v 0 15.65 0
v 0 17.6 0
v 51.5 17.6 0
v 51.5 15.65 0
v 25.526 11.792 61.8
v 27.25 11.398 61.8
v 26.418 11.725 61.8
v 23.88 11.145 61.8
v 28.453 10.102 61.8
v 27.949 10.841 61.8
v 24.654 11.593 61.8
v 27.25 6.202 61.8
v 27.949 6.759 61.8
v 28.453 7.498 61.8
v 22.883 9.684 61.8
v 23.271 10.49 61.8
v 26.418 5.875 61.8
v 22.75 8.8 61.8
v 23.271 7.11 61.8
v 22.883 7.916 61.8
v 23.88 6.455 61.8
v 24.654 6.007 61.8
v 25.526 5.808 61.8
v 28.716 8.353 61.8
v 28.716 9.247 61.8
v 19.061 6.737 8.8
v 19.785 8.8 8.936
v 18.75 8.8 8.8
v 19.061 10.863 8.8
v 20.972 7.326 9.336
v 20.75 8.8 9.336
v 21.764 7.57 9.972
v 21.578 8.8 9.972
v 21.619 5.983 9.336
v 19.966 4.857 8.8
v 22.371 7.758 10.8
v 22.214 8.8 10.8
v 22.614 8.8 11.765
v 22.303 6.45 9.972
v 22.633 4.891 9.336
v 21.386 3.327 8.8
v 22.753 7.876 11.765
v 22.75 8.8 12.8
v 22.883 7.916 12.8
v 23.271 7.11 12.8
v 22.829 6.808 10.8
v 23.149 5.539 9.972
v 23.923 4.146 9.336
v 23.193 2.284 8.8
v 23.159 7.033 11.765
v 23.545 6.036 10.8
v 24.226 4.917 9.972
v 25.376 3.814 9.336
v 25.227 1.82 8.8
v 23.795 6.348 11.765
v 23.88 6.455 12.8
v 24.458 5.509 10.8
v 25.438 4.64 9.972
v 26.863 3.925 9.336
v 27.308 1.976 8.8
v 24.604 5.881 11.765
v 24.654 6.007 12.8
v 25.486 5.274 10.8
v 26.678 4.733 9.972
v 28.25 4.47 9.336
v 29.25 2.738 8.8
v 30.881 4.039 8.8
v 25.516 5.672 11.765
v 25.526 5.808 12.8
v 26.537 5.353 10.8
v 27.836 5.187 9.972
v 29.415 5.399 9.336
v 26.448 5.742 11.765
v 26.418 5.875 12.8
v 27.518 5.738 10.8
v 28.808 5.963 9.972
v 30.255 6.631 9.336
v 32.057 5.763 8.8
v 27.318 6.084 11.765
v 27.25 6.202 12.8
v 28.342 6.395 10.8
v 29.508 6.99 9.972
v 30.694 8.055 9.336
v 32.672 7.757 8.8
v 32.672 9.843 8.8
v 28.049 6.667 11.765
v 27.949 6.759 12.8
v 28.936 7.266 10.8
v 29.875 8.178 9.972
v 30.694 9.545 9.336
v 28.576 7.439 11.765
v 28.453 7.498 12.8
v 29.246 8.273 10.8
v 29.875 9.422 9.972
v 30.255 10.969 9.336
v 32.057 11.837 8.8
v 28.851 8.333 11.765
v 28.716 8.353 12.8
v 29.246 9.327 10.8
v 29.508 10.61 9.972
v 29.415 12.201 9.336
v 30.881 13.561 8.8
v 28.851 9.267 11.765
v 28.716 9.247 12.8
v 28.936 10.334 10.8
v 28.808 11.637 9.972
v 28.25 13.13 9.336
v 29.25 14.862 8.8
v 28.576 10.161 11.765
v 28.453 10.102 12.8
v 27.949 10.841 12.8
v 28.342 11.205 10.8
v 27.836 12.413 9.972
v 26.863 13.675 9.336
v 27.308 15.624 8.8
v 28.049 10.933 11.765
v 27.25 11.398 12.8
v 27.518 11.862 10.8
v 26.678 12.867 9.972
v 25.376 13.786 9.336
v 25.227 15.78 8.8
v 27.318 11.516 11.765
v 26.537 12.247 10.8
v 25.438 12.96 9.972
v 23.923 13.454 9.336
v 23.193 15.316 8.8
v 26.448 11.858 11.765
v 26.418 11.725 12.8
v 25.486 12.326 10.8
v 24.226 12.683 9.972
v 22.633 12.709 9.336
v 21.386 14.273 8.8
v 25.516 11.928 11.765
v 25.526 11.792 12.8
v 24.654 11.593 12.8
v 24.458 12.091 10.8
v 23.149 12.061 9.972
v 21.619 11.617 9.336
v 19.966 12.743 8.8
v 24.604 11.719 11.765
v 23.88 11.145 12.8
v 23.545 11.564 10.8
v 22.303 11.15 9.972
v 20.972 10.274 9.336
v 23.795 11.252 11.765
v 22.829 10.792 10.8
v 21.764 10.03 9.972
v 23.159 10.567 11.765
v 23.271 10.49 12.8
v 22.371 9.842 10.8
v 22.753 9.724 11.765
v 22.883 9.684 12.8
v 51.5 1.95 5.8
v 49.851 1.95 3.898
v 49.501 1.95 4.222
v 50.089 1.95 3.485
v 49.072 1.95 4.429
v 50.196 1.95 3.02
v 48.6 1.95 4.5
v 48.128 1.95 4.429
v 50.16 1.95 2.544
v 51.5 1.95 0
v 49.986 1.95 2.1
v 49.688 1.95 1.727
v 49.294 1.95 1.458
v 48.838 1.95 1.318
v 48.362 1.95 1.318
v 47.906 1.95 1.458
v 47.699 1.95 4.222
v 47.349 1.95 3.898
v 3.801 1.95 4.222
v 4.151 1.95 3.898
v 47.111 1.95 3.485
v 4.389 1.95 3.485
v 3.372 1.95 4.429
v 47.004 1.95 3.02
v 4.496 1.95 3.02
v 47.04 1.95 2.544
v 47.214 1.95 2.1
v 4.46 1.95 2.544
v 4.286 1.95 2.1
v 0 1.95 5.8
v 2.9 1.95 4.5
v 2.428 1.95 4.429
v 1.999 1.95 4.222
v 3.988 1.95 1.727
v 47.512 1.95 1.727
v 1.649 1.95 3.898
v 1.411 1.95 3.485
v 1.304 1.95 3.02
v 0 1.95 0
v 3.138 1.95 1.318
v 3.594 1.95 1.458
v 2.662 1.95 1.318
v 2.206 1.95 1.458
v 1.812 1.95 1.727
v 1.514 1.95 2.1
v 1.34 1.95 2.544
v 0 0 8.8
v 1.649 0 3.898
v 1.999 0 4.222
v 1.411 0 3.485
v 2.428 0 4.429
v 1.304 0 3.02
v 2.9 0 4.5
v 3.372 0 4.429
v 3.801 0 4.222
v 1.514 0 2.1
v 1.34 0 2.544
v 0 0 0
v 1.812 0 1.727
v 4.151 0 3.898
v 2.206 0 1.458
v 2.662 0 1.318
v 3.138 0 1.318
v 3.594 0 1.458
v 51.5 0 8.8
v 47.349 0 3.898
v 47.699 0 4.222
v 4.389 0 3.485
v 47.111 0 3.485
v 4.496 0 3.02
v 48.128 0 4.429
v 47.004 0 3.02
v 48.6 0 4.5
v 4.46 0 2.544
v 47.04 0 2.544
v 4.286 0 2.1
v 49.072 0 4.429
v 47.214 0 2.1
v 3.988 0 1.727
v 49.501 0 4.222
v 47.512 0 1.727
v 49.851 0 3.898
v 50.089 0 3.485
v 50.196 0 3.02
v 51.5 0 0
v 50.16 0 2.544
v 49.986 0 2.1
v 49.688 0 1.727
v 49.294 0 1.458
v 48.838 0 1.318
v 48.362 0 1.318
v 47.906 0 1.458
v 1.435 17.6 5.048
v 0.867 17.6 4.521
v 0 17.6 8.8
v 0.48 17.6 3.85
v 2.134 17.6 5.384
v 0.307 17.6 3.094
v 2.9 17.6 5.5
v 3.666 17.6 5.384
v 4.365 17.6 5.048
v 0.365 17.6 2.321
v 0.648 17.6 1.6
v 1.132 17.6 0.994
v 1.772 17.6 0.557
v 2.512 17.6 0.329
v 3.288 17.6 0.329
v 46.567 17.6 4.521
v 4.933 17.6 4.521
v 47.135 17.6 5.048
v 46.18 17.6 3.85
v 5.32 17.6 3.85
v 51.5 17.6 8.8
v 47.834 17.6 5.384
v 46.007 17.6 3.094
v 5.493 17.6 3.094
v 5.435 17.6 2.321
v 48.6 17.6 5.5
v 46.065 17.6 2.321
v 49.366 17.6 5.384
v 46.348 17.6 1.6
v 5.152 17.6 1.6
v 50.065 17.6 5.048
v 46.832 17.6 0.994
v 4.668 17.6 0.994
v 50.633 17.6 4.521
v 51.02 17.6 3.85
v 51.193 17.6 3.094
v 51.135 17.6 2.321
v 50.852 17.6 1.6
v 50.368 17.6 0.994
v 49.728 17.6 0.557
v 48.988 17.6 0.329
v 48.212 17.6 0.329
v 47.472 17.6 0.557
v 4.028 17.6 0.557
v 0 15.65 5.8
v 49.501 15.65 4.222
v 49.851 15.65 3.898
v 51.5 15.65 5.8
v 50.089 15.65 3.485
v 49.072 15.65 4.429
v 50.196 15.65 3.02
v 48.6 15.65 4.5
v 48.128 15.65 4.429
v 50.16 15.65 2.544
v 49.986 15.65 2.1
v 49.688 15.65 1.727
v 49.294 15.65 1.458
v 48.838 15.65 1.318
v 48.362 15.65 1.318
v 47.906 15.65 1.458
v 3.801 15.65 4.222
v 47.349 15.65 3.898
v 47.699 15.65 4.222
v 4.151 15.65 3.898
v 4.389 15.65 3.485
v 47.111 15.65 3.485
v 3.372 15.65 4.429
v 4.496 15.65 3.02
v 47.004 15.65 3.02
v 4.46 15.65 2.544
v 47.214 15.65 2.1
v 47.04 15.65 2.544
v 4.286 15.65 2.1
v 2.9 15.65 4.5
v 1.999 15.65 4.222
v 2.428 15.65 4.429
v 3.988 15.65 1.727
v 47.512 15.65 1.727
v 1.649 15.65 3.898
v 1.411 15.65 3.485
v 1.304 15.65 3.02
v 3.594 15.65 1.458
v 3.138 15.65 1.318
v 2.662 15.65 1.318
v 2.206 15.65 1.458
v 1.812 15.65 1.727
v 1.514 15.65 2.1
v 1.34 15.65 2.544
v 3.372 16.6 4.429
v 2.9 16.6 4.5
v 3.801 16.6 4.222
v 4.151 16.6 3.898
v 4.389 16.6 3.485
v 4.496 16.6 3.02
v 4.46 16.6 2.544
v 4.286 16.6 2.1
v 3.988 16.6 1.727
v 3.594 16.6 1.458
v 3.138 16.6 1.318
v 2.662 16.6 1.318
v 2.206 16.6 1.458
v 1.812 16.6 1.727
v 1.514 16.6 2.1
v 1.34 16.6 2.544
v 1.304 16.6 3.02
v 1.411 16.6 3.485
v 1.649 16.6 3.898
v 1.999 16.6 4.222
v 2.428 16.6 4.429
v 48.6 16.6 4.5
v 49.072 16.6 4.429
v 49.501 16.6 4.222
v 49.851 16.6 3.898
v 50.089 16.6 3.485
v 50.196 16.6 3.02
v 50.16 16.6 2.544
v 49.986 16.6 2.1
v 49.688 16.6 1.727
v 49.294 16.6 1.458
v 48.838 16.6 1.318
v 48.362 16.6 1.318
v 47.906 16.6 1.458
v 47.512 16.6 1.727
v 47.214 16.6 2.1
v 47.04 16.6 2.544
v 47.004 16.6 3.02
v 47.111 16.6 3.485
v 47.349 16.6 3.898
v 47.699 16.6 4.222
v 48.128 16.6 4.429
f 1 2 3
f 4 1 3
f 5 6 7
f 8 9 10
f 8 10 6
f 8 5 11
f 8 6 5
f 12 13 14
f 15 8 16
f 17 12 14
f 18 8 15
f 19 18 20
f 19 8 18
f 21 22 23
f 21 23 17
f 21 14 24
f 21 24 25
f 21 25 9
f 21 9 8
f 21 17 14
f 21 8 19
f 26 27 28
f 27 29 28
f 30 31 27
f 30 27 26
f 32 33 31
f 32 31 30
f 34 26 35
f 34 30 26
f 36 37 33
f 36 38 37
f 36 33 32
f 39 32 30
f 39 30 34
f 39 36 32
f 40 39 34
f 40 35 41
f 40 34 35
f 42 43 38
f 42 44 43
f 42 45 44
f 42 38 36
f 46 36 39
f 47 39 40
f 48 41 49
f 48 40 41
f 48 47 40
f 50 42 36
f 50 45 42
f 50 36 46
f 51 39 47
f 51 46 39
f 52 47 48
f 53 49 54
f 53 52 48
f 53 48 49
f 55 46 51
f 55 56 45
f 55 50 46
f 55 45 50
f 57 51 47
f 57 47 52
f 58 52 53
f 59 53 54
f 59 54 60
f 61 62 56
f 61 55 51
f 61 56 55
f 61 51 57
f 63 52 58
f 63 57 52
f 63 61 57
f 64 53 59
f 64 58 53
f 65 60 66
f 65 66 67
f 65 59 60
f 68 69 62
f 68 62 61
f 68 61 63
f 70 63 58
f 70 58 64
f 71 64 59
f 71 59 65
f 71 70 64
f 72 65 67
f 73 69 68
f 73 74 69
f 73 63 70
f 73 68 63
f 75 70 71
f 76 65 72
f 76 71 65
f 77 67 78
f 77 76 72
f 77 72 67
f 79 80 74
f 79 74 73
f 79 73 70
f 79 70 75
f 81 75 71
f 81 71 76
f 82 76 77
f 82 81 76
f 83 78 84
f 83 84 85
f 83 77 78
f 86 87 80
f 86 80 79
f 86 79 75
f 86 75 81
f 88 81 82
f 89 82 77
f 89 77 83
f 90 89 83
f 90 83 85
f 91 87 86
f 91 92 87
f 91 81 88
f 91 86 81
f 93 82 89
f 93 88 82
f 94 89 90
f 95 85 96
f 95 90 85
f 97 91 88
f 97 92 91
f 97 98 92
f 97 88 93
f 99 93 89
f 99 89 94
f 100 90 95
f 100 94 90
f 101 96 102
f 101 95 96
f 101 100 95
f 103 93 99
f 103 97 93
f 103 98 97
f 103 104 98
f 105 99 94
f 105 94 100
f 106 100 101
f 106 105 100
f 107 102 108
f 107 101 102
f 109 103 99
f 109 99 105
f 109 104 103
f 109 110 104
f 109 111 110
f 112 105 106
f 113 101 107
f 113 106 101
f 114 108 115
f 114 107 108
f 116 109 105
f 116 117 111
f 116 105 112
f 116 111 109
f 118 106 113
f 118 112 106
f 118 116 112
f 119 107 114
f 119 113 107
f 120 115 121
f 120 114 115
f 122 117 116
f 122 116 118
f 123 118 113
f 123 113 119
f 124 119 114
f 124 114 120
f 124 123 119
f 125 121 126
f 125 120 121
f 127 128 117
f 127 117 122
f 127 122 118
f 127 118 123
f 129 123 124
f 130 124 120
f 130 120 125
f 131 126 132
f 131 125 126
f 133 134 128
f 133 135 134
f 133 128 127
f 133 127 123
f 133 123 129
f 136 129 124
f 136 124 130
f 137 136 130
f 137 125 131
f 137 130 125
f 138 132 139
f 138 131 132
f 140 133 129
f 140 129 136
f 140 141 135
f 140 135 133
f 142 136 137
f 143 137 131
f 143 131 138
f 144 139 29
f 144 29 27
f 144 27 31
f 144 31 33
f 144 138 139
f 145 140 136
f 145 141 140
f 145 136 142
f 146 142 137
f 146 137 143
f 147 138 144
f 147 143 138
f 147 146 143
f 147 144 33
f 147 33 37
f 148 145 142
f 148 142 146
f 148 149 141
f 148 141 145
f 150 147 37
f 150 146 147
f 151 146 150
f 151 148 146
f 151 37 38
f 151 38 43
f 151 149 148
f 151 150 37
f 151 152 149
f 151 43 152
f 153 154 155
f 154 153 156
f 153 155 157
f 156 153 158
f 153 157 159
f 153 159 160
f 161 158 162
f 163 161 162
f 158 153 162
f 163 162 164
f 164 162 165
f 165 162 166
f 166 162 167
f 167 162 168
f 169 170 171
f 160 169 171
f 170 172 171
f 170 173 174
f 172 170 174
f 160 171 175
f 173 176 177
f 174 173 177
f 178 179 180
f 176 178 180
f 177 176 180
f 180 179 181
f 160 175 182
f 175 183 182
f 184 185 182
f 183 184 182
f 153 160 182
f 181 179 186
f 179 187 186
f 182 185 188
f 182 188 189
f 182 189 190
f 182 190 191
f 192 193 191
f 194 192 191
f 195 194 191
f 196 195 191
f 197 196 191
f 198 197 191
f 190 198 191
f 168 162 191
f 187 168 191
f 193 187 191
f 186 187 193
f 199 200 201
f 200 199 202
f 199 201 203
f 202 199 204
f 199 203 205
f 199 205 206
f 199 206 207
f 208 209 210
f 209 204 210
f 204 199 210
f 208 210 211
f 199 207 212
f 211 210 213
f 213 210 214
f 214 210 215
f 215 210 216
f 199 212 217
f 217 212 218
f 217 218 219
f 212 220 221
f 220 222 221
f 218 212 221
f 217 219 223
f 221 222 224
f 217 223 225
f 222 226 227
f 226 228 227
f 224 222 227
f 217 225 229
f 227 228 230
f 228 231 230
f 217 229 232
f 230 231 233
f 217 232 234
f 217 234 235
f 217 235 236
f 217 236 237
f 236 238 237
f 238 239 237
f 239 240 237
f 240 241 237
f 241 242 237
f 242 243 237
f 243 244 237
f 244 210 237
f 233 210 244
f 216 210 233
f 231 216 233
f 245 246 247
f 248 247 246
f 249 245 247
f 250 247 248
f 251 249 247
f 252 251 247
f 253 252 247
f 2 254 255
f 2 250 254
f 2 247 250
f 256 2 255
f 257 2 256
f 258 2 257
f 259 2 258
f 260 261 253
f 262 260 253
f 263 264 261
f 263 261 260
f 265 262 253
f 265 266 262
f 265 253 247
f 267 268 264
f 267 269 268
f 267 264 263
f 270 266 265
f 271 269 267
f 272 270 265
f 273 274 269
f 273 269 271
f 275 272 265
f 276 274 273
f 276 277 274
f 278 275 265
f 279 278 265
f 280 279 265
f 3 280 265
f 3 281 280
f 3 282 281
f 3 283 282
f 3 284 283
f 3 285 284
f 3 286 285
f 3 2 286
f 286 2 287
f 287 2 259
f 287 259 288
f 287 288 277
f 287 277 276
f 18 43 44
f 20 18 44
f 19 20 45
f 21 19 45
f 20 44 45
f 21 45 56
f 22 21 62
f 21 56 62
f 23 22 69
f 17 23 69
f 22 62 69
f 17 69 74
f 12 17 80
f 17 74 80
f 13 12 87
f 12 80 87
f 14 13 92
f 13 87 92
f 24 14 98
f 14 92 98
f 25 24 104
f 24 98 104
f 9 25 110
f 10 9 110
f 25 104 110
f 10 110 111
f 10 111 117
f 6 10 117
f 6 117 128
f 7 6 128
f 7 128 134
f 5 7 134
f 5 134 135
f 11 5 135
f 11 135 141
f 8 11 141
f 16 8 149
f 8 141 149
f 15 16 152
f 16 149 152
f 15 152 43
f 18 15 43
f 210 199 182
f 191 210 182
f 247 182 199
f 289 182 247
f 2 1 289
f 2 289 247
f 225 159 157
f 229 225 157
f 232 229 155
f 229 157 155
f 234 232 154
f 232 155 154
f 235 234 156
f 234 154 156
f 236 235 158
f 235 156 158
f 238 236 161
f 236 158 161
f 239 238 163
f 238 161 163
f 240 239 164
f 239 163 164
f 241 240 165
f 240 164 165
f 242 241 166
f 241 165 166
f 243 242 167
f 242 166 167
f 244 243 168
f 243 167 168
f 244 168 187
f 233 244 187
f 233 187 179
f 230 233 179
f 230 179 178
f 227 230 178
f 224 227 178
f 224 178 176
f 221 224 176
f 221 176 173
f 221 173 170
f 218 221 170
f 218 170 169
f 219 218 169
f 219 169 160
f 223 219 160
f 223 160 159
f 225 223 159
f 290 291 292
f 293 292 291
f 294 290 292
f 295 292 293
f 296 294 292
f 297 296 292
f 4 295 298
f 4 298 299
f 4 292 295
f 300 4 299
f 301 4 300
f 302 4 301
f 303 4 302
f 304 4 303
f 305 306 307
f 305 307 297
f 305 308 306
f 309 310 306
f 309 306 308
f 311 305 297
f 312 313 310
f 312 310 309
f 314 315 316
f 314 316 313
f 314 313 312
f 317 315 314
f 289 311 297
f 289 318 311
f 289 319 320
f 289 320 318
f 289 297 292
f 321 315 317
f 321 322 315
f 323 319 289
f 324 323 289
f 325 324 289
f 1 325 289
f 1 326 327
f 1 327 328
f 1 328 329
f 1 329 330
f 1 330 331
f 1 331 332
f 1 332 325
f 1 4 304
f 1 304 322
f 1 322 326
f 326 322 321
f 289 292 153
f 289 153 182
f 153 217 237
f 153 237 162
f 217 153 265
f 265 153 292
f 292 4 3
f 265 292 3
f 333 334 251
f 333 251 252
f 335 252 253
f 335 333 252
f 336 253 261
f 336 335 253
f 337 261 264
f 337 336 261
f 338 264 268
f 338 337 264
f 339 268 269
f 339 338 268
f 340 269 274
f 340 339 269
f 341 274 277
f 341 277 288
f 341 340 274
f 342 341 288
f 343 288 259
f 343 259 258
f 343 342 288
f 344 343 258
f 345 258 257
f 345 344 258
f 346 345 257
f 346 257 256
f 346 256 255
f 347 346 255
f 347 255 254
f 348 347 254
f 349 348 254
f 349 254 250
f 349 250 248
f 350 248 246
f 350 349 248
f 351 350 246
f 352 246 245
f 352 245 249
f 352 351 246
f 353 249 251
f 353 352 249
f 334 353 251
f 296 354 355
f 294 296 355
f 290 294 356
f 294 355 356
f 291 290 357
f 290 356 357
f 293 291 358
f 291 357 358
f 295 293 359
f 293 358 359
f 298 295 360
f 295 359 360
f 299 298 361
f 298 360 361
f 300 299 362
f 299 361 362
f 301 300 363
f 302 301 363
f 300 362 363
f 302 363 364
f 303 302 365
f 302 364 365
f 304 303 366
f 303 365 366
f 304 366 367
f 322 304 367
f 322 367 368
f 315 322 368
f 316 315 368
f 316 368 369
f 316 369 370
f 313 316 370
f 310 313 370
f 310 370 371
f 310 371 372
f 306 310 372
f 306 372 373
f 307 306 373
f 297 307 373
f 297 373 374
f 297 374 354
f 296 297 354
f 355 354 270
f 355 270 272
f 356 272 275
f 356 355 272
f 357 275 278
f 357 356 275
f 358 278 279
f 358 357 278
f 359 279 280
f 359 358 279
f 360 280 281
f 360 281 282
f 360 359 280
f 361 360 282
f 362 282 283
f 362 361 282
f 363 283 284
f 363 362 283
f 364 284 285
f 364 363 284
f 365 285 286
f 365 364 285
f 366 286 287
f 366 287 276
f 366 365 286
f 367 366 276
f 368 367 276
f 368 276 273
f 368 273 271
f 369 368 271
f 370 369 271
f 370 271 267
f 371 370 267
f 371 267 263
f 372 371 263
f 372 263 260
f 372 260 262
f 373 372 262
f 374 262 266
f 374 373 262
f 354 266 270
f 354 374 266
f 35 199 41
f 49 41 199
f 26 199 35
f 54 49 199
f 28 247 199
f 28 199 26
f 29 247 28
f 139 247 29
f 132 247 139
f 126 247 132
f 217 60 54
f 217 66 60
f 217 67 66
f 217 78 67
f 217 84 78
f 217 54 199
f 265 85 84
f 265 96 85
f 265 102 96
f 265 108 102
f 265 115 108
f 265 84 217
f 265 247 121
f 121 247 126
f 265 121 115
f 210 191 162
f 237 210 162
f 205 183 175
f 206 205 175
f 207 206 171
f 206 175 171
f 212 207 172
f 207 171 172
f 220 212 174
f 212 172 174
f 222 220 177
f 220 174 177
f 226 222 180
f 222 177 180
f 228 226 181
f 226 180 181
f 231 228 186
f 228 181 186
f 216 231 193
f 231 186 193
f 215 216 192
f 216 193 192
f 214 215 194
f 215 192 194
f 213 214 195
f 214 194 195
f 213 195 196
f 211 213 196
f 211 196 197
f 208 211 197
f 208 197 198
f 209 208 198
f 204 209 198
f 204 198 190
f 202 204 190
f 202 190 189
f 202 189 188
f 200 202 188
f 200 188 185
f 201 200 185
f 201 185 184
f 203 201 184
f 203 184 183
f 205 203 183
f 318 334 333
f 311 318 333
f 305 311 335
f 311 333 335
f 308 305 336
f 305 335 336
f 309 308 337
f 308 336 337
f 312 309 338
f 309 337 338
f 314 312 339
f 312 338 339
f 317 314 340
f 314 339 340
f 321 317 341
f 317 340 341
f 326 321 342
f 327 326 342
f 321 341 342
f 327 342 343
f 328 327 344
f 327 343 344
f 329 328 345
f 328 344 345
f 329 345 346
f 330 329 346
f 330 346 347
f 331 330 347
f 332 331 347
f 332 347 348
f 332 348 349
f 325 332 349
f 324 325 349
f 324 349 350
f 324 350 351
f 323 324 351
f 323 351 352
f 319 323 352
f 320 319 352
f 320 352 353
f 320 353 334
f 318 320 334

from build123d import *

# Parameters (mm, degrees)
SKETCH1_W           = 51.5
SKETCH1_H           = 17.6
BOSS_EXTRUDE1_DEPTH = 8.8
SKETCH2_W           = 51.5
SKETCH2_H           = 13.7
CUT_EXTRUDE1_DEPTH  = 5.8
SKETCH3_R           = 1.6
CUT_EXTRUDE2_DEPTH  = 17.8
CHAMFER1_SIZE       = 1
SKETCH4_R           = 3
BOSS_EXTRUDE2_DEPTH = 53
FILLET1_R           = 4


with BuildPart() as part:
    # Sketch1 → Boss-Extrude1 (new body)
    with BuildSketch(Plane.XY):
        with Locations((25.75, 8.8)):
            Rectangle(SKETCH1_W, SKETCH1_H)
    extrude(amount=BOSS_EXTRUDE1_DEPTH)

    # Sketch2 → Cut-Extrude1 (cut)
    with BuildSketch(Plane(origin=(0, 0, 0), x_dir=(-1, 0, 0), z_dir=(0, 0, -1))):
        with Locations((-25.75, 8.8)):
            Rectangle(SKETCH2_W, SKETCH2_H)
    extrude(amount=-CUT_EXTRUDE1_DEPTH, mode=Mode.SUBTRACT)

    # Sketch3 → Cut-Extrude2 (cut)
    with BuildSketch(Plane(origin=(0, 17.6, 0), x_dir=(1, 0, 0), z_dir=(0, 1, 0))):
        with Locations(Location((2.9, -2.9, 0), (0, 0, 270))):
            Circle(SKETCH3_R)
        with Locations(Location((48.6, -2.9, 0), (0, 0, 270))):
            Circle(SKETCH3_R)
    extrude(amount=-CUT_EXTRUDE2_DEPTH, mode=Mode.SUBTRACT)

    # Chamfer1
    chamfer1_edges = [part.edges().sort_by_distance(p)[0] for p in [
        (2.9, 17.6, 1.3),
        (48.6, 17.6, 1.3),
    ]]
    chamfer(chamfer1_edges, length=CHAMFER1_SIZE)

    # Sketch4 → Boss-Extrude2 (add)
    with BuildSketch(Plane.XY.offset(8.8)):
        with Locations(Location((25.75, 8.8, 0), (0, 0, 180))):
            Circle(SKETCH4_R)
    extrude(amount=BOSS_EXTRUDE2_DEPTH)

    # Fillet1
    fillet1_edges = [part.edges().sort_by_distance(p)[0] for p in [
        (28.75, 8.8, 8.8),
    ]]
    fillet(fillet1_edges, radius=FILLET1_R)


solid = part.part
